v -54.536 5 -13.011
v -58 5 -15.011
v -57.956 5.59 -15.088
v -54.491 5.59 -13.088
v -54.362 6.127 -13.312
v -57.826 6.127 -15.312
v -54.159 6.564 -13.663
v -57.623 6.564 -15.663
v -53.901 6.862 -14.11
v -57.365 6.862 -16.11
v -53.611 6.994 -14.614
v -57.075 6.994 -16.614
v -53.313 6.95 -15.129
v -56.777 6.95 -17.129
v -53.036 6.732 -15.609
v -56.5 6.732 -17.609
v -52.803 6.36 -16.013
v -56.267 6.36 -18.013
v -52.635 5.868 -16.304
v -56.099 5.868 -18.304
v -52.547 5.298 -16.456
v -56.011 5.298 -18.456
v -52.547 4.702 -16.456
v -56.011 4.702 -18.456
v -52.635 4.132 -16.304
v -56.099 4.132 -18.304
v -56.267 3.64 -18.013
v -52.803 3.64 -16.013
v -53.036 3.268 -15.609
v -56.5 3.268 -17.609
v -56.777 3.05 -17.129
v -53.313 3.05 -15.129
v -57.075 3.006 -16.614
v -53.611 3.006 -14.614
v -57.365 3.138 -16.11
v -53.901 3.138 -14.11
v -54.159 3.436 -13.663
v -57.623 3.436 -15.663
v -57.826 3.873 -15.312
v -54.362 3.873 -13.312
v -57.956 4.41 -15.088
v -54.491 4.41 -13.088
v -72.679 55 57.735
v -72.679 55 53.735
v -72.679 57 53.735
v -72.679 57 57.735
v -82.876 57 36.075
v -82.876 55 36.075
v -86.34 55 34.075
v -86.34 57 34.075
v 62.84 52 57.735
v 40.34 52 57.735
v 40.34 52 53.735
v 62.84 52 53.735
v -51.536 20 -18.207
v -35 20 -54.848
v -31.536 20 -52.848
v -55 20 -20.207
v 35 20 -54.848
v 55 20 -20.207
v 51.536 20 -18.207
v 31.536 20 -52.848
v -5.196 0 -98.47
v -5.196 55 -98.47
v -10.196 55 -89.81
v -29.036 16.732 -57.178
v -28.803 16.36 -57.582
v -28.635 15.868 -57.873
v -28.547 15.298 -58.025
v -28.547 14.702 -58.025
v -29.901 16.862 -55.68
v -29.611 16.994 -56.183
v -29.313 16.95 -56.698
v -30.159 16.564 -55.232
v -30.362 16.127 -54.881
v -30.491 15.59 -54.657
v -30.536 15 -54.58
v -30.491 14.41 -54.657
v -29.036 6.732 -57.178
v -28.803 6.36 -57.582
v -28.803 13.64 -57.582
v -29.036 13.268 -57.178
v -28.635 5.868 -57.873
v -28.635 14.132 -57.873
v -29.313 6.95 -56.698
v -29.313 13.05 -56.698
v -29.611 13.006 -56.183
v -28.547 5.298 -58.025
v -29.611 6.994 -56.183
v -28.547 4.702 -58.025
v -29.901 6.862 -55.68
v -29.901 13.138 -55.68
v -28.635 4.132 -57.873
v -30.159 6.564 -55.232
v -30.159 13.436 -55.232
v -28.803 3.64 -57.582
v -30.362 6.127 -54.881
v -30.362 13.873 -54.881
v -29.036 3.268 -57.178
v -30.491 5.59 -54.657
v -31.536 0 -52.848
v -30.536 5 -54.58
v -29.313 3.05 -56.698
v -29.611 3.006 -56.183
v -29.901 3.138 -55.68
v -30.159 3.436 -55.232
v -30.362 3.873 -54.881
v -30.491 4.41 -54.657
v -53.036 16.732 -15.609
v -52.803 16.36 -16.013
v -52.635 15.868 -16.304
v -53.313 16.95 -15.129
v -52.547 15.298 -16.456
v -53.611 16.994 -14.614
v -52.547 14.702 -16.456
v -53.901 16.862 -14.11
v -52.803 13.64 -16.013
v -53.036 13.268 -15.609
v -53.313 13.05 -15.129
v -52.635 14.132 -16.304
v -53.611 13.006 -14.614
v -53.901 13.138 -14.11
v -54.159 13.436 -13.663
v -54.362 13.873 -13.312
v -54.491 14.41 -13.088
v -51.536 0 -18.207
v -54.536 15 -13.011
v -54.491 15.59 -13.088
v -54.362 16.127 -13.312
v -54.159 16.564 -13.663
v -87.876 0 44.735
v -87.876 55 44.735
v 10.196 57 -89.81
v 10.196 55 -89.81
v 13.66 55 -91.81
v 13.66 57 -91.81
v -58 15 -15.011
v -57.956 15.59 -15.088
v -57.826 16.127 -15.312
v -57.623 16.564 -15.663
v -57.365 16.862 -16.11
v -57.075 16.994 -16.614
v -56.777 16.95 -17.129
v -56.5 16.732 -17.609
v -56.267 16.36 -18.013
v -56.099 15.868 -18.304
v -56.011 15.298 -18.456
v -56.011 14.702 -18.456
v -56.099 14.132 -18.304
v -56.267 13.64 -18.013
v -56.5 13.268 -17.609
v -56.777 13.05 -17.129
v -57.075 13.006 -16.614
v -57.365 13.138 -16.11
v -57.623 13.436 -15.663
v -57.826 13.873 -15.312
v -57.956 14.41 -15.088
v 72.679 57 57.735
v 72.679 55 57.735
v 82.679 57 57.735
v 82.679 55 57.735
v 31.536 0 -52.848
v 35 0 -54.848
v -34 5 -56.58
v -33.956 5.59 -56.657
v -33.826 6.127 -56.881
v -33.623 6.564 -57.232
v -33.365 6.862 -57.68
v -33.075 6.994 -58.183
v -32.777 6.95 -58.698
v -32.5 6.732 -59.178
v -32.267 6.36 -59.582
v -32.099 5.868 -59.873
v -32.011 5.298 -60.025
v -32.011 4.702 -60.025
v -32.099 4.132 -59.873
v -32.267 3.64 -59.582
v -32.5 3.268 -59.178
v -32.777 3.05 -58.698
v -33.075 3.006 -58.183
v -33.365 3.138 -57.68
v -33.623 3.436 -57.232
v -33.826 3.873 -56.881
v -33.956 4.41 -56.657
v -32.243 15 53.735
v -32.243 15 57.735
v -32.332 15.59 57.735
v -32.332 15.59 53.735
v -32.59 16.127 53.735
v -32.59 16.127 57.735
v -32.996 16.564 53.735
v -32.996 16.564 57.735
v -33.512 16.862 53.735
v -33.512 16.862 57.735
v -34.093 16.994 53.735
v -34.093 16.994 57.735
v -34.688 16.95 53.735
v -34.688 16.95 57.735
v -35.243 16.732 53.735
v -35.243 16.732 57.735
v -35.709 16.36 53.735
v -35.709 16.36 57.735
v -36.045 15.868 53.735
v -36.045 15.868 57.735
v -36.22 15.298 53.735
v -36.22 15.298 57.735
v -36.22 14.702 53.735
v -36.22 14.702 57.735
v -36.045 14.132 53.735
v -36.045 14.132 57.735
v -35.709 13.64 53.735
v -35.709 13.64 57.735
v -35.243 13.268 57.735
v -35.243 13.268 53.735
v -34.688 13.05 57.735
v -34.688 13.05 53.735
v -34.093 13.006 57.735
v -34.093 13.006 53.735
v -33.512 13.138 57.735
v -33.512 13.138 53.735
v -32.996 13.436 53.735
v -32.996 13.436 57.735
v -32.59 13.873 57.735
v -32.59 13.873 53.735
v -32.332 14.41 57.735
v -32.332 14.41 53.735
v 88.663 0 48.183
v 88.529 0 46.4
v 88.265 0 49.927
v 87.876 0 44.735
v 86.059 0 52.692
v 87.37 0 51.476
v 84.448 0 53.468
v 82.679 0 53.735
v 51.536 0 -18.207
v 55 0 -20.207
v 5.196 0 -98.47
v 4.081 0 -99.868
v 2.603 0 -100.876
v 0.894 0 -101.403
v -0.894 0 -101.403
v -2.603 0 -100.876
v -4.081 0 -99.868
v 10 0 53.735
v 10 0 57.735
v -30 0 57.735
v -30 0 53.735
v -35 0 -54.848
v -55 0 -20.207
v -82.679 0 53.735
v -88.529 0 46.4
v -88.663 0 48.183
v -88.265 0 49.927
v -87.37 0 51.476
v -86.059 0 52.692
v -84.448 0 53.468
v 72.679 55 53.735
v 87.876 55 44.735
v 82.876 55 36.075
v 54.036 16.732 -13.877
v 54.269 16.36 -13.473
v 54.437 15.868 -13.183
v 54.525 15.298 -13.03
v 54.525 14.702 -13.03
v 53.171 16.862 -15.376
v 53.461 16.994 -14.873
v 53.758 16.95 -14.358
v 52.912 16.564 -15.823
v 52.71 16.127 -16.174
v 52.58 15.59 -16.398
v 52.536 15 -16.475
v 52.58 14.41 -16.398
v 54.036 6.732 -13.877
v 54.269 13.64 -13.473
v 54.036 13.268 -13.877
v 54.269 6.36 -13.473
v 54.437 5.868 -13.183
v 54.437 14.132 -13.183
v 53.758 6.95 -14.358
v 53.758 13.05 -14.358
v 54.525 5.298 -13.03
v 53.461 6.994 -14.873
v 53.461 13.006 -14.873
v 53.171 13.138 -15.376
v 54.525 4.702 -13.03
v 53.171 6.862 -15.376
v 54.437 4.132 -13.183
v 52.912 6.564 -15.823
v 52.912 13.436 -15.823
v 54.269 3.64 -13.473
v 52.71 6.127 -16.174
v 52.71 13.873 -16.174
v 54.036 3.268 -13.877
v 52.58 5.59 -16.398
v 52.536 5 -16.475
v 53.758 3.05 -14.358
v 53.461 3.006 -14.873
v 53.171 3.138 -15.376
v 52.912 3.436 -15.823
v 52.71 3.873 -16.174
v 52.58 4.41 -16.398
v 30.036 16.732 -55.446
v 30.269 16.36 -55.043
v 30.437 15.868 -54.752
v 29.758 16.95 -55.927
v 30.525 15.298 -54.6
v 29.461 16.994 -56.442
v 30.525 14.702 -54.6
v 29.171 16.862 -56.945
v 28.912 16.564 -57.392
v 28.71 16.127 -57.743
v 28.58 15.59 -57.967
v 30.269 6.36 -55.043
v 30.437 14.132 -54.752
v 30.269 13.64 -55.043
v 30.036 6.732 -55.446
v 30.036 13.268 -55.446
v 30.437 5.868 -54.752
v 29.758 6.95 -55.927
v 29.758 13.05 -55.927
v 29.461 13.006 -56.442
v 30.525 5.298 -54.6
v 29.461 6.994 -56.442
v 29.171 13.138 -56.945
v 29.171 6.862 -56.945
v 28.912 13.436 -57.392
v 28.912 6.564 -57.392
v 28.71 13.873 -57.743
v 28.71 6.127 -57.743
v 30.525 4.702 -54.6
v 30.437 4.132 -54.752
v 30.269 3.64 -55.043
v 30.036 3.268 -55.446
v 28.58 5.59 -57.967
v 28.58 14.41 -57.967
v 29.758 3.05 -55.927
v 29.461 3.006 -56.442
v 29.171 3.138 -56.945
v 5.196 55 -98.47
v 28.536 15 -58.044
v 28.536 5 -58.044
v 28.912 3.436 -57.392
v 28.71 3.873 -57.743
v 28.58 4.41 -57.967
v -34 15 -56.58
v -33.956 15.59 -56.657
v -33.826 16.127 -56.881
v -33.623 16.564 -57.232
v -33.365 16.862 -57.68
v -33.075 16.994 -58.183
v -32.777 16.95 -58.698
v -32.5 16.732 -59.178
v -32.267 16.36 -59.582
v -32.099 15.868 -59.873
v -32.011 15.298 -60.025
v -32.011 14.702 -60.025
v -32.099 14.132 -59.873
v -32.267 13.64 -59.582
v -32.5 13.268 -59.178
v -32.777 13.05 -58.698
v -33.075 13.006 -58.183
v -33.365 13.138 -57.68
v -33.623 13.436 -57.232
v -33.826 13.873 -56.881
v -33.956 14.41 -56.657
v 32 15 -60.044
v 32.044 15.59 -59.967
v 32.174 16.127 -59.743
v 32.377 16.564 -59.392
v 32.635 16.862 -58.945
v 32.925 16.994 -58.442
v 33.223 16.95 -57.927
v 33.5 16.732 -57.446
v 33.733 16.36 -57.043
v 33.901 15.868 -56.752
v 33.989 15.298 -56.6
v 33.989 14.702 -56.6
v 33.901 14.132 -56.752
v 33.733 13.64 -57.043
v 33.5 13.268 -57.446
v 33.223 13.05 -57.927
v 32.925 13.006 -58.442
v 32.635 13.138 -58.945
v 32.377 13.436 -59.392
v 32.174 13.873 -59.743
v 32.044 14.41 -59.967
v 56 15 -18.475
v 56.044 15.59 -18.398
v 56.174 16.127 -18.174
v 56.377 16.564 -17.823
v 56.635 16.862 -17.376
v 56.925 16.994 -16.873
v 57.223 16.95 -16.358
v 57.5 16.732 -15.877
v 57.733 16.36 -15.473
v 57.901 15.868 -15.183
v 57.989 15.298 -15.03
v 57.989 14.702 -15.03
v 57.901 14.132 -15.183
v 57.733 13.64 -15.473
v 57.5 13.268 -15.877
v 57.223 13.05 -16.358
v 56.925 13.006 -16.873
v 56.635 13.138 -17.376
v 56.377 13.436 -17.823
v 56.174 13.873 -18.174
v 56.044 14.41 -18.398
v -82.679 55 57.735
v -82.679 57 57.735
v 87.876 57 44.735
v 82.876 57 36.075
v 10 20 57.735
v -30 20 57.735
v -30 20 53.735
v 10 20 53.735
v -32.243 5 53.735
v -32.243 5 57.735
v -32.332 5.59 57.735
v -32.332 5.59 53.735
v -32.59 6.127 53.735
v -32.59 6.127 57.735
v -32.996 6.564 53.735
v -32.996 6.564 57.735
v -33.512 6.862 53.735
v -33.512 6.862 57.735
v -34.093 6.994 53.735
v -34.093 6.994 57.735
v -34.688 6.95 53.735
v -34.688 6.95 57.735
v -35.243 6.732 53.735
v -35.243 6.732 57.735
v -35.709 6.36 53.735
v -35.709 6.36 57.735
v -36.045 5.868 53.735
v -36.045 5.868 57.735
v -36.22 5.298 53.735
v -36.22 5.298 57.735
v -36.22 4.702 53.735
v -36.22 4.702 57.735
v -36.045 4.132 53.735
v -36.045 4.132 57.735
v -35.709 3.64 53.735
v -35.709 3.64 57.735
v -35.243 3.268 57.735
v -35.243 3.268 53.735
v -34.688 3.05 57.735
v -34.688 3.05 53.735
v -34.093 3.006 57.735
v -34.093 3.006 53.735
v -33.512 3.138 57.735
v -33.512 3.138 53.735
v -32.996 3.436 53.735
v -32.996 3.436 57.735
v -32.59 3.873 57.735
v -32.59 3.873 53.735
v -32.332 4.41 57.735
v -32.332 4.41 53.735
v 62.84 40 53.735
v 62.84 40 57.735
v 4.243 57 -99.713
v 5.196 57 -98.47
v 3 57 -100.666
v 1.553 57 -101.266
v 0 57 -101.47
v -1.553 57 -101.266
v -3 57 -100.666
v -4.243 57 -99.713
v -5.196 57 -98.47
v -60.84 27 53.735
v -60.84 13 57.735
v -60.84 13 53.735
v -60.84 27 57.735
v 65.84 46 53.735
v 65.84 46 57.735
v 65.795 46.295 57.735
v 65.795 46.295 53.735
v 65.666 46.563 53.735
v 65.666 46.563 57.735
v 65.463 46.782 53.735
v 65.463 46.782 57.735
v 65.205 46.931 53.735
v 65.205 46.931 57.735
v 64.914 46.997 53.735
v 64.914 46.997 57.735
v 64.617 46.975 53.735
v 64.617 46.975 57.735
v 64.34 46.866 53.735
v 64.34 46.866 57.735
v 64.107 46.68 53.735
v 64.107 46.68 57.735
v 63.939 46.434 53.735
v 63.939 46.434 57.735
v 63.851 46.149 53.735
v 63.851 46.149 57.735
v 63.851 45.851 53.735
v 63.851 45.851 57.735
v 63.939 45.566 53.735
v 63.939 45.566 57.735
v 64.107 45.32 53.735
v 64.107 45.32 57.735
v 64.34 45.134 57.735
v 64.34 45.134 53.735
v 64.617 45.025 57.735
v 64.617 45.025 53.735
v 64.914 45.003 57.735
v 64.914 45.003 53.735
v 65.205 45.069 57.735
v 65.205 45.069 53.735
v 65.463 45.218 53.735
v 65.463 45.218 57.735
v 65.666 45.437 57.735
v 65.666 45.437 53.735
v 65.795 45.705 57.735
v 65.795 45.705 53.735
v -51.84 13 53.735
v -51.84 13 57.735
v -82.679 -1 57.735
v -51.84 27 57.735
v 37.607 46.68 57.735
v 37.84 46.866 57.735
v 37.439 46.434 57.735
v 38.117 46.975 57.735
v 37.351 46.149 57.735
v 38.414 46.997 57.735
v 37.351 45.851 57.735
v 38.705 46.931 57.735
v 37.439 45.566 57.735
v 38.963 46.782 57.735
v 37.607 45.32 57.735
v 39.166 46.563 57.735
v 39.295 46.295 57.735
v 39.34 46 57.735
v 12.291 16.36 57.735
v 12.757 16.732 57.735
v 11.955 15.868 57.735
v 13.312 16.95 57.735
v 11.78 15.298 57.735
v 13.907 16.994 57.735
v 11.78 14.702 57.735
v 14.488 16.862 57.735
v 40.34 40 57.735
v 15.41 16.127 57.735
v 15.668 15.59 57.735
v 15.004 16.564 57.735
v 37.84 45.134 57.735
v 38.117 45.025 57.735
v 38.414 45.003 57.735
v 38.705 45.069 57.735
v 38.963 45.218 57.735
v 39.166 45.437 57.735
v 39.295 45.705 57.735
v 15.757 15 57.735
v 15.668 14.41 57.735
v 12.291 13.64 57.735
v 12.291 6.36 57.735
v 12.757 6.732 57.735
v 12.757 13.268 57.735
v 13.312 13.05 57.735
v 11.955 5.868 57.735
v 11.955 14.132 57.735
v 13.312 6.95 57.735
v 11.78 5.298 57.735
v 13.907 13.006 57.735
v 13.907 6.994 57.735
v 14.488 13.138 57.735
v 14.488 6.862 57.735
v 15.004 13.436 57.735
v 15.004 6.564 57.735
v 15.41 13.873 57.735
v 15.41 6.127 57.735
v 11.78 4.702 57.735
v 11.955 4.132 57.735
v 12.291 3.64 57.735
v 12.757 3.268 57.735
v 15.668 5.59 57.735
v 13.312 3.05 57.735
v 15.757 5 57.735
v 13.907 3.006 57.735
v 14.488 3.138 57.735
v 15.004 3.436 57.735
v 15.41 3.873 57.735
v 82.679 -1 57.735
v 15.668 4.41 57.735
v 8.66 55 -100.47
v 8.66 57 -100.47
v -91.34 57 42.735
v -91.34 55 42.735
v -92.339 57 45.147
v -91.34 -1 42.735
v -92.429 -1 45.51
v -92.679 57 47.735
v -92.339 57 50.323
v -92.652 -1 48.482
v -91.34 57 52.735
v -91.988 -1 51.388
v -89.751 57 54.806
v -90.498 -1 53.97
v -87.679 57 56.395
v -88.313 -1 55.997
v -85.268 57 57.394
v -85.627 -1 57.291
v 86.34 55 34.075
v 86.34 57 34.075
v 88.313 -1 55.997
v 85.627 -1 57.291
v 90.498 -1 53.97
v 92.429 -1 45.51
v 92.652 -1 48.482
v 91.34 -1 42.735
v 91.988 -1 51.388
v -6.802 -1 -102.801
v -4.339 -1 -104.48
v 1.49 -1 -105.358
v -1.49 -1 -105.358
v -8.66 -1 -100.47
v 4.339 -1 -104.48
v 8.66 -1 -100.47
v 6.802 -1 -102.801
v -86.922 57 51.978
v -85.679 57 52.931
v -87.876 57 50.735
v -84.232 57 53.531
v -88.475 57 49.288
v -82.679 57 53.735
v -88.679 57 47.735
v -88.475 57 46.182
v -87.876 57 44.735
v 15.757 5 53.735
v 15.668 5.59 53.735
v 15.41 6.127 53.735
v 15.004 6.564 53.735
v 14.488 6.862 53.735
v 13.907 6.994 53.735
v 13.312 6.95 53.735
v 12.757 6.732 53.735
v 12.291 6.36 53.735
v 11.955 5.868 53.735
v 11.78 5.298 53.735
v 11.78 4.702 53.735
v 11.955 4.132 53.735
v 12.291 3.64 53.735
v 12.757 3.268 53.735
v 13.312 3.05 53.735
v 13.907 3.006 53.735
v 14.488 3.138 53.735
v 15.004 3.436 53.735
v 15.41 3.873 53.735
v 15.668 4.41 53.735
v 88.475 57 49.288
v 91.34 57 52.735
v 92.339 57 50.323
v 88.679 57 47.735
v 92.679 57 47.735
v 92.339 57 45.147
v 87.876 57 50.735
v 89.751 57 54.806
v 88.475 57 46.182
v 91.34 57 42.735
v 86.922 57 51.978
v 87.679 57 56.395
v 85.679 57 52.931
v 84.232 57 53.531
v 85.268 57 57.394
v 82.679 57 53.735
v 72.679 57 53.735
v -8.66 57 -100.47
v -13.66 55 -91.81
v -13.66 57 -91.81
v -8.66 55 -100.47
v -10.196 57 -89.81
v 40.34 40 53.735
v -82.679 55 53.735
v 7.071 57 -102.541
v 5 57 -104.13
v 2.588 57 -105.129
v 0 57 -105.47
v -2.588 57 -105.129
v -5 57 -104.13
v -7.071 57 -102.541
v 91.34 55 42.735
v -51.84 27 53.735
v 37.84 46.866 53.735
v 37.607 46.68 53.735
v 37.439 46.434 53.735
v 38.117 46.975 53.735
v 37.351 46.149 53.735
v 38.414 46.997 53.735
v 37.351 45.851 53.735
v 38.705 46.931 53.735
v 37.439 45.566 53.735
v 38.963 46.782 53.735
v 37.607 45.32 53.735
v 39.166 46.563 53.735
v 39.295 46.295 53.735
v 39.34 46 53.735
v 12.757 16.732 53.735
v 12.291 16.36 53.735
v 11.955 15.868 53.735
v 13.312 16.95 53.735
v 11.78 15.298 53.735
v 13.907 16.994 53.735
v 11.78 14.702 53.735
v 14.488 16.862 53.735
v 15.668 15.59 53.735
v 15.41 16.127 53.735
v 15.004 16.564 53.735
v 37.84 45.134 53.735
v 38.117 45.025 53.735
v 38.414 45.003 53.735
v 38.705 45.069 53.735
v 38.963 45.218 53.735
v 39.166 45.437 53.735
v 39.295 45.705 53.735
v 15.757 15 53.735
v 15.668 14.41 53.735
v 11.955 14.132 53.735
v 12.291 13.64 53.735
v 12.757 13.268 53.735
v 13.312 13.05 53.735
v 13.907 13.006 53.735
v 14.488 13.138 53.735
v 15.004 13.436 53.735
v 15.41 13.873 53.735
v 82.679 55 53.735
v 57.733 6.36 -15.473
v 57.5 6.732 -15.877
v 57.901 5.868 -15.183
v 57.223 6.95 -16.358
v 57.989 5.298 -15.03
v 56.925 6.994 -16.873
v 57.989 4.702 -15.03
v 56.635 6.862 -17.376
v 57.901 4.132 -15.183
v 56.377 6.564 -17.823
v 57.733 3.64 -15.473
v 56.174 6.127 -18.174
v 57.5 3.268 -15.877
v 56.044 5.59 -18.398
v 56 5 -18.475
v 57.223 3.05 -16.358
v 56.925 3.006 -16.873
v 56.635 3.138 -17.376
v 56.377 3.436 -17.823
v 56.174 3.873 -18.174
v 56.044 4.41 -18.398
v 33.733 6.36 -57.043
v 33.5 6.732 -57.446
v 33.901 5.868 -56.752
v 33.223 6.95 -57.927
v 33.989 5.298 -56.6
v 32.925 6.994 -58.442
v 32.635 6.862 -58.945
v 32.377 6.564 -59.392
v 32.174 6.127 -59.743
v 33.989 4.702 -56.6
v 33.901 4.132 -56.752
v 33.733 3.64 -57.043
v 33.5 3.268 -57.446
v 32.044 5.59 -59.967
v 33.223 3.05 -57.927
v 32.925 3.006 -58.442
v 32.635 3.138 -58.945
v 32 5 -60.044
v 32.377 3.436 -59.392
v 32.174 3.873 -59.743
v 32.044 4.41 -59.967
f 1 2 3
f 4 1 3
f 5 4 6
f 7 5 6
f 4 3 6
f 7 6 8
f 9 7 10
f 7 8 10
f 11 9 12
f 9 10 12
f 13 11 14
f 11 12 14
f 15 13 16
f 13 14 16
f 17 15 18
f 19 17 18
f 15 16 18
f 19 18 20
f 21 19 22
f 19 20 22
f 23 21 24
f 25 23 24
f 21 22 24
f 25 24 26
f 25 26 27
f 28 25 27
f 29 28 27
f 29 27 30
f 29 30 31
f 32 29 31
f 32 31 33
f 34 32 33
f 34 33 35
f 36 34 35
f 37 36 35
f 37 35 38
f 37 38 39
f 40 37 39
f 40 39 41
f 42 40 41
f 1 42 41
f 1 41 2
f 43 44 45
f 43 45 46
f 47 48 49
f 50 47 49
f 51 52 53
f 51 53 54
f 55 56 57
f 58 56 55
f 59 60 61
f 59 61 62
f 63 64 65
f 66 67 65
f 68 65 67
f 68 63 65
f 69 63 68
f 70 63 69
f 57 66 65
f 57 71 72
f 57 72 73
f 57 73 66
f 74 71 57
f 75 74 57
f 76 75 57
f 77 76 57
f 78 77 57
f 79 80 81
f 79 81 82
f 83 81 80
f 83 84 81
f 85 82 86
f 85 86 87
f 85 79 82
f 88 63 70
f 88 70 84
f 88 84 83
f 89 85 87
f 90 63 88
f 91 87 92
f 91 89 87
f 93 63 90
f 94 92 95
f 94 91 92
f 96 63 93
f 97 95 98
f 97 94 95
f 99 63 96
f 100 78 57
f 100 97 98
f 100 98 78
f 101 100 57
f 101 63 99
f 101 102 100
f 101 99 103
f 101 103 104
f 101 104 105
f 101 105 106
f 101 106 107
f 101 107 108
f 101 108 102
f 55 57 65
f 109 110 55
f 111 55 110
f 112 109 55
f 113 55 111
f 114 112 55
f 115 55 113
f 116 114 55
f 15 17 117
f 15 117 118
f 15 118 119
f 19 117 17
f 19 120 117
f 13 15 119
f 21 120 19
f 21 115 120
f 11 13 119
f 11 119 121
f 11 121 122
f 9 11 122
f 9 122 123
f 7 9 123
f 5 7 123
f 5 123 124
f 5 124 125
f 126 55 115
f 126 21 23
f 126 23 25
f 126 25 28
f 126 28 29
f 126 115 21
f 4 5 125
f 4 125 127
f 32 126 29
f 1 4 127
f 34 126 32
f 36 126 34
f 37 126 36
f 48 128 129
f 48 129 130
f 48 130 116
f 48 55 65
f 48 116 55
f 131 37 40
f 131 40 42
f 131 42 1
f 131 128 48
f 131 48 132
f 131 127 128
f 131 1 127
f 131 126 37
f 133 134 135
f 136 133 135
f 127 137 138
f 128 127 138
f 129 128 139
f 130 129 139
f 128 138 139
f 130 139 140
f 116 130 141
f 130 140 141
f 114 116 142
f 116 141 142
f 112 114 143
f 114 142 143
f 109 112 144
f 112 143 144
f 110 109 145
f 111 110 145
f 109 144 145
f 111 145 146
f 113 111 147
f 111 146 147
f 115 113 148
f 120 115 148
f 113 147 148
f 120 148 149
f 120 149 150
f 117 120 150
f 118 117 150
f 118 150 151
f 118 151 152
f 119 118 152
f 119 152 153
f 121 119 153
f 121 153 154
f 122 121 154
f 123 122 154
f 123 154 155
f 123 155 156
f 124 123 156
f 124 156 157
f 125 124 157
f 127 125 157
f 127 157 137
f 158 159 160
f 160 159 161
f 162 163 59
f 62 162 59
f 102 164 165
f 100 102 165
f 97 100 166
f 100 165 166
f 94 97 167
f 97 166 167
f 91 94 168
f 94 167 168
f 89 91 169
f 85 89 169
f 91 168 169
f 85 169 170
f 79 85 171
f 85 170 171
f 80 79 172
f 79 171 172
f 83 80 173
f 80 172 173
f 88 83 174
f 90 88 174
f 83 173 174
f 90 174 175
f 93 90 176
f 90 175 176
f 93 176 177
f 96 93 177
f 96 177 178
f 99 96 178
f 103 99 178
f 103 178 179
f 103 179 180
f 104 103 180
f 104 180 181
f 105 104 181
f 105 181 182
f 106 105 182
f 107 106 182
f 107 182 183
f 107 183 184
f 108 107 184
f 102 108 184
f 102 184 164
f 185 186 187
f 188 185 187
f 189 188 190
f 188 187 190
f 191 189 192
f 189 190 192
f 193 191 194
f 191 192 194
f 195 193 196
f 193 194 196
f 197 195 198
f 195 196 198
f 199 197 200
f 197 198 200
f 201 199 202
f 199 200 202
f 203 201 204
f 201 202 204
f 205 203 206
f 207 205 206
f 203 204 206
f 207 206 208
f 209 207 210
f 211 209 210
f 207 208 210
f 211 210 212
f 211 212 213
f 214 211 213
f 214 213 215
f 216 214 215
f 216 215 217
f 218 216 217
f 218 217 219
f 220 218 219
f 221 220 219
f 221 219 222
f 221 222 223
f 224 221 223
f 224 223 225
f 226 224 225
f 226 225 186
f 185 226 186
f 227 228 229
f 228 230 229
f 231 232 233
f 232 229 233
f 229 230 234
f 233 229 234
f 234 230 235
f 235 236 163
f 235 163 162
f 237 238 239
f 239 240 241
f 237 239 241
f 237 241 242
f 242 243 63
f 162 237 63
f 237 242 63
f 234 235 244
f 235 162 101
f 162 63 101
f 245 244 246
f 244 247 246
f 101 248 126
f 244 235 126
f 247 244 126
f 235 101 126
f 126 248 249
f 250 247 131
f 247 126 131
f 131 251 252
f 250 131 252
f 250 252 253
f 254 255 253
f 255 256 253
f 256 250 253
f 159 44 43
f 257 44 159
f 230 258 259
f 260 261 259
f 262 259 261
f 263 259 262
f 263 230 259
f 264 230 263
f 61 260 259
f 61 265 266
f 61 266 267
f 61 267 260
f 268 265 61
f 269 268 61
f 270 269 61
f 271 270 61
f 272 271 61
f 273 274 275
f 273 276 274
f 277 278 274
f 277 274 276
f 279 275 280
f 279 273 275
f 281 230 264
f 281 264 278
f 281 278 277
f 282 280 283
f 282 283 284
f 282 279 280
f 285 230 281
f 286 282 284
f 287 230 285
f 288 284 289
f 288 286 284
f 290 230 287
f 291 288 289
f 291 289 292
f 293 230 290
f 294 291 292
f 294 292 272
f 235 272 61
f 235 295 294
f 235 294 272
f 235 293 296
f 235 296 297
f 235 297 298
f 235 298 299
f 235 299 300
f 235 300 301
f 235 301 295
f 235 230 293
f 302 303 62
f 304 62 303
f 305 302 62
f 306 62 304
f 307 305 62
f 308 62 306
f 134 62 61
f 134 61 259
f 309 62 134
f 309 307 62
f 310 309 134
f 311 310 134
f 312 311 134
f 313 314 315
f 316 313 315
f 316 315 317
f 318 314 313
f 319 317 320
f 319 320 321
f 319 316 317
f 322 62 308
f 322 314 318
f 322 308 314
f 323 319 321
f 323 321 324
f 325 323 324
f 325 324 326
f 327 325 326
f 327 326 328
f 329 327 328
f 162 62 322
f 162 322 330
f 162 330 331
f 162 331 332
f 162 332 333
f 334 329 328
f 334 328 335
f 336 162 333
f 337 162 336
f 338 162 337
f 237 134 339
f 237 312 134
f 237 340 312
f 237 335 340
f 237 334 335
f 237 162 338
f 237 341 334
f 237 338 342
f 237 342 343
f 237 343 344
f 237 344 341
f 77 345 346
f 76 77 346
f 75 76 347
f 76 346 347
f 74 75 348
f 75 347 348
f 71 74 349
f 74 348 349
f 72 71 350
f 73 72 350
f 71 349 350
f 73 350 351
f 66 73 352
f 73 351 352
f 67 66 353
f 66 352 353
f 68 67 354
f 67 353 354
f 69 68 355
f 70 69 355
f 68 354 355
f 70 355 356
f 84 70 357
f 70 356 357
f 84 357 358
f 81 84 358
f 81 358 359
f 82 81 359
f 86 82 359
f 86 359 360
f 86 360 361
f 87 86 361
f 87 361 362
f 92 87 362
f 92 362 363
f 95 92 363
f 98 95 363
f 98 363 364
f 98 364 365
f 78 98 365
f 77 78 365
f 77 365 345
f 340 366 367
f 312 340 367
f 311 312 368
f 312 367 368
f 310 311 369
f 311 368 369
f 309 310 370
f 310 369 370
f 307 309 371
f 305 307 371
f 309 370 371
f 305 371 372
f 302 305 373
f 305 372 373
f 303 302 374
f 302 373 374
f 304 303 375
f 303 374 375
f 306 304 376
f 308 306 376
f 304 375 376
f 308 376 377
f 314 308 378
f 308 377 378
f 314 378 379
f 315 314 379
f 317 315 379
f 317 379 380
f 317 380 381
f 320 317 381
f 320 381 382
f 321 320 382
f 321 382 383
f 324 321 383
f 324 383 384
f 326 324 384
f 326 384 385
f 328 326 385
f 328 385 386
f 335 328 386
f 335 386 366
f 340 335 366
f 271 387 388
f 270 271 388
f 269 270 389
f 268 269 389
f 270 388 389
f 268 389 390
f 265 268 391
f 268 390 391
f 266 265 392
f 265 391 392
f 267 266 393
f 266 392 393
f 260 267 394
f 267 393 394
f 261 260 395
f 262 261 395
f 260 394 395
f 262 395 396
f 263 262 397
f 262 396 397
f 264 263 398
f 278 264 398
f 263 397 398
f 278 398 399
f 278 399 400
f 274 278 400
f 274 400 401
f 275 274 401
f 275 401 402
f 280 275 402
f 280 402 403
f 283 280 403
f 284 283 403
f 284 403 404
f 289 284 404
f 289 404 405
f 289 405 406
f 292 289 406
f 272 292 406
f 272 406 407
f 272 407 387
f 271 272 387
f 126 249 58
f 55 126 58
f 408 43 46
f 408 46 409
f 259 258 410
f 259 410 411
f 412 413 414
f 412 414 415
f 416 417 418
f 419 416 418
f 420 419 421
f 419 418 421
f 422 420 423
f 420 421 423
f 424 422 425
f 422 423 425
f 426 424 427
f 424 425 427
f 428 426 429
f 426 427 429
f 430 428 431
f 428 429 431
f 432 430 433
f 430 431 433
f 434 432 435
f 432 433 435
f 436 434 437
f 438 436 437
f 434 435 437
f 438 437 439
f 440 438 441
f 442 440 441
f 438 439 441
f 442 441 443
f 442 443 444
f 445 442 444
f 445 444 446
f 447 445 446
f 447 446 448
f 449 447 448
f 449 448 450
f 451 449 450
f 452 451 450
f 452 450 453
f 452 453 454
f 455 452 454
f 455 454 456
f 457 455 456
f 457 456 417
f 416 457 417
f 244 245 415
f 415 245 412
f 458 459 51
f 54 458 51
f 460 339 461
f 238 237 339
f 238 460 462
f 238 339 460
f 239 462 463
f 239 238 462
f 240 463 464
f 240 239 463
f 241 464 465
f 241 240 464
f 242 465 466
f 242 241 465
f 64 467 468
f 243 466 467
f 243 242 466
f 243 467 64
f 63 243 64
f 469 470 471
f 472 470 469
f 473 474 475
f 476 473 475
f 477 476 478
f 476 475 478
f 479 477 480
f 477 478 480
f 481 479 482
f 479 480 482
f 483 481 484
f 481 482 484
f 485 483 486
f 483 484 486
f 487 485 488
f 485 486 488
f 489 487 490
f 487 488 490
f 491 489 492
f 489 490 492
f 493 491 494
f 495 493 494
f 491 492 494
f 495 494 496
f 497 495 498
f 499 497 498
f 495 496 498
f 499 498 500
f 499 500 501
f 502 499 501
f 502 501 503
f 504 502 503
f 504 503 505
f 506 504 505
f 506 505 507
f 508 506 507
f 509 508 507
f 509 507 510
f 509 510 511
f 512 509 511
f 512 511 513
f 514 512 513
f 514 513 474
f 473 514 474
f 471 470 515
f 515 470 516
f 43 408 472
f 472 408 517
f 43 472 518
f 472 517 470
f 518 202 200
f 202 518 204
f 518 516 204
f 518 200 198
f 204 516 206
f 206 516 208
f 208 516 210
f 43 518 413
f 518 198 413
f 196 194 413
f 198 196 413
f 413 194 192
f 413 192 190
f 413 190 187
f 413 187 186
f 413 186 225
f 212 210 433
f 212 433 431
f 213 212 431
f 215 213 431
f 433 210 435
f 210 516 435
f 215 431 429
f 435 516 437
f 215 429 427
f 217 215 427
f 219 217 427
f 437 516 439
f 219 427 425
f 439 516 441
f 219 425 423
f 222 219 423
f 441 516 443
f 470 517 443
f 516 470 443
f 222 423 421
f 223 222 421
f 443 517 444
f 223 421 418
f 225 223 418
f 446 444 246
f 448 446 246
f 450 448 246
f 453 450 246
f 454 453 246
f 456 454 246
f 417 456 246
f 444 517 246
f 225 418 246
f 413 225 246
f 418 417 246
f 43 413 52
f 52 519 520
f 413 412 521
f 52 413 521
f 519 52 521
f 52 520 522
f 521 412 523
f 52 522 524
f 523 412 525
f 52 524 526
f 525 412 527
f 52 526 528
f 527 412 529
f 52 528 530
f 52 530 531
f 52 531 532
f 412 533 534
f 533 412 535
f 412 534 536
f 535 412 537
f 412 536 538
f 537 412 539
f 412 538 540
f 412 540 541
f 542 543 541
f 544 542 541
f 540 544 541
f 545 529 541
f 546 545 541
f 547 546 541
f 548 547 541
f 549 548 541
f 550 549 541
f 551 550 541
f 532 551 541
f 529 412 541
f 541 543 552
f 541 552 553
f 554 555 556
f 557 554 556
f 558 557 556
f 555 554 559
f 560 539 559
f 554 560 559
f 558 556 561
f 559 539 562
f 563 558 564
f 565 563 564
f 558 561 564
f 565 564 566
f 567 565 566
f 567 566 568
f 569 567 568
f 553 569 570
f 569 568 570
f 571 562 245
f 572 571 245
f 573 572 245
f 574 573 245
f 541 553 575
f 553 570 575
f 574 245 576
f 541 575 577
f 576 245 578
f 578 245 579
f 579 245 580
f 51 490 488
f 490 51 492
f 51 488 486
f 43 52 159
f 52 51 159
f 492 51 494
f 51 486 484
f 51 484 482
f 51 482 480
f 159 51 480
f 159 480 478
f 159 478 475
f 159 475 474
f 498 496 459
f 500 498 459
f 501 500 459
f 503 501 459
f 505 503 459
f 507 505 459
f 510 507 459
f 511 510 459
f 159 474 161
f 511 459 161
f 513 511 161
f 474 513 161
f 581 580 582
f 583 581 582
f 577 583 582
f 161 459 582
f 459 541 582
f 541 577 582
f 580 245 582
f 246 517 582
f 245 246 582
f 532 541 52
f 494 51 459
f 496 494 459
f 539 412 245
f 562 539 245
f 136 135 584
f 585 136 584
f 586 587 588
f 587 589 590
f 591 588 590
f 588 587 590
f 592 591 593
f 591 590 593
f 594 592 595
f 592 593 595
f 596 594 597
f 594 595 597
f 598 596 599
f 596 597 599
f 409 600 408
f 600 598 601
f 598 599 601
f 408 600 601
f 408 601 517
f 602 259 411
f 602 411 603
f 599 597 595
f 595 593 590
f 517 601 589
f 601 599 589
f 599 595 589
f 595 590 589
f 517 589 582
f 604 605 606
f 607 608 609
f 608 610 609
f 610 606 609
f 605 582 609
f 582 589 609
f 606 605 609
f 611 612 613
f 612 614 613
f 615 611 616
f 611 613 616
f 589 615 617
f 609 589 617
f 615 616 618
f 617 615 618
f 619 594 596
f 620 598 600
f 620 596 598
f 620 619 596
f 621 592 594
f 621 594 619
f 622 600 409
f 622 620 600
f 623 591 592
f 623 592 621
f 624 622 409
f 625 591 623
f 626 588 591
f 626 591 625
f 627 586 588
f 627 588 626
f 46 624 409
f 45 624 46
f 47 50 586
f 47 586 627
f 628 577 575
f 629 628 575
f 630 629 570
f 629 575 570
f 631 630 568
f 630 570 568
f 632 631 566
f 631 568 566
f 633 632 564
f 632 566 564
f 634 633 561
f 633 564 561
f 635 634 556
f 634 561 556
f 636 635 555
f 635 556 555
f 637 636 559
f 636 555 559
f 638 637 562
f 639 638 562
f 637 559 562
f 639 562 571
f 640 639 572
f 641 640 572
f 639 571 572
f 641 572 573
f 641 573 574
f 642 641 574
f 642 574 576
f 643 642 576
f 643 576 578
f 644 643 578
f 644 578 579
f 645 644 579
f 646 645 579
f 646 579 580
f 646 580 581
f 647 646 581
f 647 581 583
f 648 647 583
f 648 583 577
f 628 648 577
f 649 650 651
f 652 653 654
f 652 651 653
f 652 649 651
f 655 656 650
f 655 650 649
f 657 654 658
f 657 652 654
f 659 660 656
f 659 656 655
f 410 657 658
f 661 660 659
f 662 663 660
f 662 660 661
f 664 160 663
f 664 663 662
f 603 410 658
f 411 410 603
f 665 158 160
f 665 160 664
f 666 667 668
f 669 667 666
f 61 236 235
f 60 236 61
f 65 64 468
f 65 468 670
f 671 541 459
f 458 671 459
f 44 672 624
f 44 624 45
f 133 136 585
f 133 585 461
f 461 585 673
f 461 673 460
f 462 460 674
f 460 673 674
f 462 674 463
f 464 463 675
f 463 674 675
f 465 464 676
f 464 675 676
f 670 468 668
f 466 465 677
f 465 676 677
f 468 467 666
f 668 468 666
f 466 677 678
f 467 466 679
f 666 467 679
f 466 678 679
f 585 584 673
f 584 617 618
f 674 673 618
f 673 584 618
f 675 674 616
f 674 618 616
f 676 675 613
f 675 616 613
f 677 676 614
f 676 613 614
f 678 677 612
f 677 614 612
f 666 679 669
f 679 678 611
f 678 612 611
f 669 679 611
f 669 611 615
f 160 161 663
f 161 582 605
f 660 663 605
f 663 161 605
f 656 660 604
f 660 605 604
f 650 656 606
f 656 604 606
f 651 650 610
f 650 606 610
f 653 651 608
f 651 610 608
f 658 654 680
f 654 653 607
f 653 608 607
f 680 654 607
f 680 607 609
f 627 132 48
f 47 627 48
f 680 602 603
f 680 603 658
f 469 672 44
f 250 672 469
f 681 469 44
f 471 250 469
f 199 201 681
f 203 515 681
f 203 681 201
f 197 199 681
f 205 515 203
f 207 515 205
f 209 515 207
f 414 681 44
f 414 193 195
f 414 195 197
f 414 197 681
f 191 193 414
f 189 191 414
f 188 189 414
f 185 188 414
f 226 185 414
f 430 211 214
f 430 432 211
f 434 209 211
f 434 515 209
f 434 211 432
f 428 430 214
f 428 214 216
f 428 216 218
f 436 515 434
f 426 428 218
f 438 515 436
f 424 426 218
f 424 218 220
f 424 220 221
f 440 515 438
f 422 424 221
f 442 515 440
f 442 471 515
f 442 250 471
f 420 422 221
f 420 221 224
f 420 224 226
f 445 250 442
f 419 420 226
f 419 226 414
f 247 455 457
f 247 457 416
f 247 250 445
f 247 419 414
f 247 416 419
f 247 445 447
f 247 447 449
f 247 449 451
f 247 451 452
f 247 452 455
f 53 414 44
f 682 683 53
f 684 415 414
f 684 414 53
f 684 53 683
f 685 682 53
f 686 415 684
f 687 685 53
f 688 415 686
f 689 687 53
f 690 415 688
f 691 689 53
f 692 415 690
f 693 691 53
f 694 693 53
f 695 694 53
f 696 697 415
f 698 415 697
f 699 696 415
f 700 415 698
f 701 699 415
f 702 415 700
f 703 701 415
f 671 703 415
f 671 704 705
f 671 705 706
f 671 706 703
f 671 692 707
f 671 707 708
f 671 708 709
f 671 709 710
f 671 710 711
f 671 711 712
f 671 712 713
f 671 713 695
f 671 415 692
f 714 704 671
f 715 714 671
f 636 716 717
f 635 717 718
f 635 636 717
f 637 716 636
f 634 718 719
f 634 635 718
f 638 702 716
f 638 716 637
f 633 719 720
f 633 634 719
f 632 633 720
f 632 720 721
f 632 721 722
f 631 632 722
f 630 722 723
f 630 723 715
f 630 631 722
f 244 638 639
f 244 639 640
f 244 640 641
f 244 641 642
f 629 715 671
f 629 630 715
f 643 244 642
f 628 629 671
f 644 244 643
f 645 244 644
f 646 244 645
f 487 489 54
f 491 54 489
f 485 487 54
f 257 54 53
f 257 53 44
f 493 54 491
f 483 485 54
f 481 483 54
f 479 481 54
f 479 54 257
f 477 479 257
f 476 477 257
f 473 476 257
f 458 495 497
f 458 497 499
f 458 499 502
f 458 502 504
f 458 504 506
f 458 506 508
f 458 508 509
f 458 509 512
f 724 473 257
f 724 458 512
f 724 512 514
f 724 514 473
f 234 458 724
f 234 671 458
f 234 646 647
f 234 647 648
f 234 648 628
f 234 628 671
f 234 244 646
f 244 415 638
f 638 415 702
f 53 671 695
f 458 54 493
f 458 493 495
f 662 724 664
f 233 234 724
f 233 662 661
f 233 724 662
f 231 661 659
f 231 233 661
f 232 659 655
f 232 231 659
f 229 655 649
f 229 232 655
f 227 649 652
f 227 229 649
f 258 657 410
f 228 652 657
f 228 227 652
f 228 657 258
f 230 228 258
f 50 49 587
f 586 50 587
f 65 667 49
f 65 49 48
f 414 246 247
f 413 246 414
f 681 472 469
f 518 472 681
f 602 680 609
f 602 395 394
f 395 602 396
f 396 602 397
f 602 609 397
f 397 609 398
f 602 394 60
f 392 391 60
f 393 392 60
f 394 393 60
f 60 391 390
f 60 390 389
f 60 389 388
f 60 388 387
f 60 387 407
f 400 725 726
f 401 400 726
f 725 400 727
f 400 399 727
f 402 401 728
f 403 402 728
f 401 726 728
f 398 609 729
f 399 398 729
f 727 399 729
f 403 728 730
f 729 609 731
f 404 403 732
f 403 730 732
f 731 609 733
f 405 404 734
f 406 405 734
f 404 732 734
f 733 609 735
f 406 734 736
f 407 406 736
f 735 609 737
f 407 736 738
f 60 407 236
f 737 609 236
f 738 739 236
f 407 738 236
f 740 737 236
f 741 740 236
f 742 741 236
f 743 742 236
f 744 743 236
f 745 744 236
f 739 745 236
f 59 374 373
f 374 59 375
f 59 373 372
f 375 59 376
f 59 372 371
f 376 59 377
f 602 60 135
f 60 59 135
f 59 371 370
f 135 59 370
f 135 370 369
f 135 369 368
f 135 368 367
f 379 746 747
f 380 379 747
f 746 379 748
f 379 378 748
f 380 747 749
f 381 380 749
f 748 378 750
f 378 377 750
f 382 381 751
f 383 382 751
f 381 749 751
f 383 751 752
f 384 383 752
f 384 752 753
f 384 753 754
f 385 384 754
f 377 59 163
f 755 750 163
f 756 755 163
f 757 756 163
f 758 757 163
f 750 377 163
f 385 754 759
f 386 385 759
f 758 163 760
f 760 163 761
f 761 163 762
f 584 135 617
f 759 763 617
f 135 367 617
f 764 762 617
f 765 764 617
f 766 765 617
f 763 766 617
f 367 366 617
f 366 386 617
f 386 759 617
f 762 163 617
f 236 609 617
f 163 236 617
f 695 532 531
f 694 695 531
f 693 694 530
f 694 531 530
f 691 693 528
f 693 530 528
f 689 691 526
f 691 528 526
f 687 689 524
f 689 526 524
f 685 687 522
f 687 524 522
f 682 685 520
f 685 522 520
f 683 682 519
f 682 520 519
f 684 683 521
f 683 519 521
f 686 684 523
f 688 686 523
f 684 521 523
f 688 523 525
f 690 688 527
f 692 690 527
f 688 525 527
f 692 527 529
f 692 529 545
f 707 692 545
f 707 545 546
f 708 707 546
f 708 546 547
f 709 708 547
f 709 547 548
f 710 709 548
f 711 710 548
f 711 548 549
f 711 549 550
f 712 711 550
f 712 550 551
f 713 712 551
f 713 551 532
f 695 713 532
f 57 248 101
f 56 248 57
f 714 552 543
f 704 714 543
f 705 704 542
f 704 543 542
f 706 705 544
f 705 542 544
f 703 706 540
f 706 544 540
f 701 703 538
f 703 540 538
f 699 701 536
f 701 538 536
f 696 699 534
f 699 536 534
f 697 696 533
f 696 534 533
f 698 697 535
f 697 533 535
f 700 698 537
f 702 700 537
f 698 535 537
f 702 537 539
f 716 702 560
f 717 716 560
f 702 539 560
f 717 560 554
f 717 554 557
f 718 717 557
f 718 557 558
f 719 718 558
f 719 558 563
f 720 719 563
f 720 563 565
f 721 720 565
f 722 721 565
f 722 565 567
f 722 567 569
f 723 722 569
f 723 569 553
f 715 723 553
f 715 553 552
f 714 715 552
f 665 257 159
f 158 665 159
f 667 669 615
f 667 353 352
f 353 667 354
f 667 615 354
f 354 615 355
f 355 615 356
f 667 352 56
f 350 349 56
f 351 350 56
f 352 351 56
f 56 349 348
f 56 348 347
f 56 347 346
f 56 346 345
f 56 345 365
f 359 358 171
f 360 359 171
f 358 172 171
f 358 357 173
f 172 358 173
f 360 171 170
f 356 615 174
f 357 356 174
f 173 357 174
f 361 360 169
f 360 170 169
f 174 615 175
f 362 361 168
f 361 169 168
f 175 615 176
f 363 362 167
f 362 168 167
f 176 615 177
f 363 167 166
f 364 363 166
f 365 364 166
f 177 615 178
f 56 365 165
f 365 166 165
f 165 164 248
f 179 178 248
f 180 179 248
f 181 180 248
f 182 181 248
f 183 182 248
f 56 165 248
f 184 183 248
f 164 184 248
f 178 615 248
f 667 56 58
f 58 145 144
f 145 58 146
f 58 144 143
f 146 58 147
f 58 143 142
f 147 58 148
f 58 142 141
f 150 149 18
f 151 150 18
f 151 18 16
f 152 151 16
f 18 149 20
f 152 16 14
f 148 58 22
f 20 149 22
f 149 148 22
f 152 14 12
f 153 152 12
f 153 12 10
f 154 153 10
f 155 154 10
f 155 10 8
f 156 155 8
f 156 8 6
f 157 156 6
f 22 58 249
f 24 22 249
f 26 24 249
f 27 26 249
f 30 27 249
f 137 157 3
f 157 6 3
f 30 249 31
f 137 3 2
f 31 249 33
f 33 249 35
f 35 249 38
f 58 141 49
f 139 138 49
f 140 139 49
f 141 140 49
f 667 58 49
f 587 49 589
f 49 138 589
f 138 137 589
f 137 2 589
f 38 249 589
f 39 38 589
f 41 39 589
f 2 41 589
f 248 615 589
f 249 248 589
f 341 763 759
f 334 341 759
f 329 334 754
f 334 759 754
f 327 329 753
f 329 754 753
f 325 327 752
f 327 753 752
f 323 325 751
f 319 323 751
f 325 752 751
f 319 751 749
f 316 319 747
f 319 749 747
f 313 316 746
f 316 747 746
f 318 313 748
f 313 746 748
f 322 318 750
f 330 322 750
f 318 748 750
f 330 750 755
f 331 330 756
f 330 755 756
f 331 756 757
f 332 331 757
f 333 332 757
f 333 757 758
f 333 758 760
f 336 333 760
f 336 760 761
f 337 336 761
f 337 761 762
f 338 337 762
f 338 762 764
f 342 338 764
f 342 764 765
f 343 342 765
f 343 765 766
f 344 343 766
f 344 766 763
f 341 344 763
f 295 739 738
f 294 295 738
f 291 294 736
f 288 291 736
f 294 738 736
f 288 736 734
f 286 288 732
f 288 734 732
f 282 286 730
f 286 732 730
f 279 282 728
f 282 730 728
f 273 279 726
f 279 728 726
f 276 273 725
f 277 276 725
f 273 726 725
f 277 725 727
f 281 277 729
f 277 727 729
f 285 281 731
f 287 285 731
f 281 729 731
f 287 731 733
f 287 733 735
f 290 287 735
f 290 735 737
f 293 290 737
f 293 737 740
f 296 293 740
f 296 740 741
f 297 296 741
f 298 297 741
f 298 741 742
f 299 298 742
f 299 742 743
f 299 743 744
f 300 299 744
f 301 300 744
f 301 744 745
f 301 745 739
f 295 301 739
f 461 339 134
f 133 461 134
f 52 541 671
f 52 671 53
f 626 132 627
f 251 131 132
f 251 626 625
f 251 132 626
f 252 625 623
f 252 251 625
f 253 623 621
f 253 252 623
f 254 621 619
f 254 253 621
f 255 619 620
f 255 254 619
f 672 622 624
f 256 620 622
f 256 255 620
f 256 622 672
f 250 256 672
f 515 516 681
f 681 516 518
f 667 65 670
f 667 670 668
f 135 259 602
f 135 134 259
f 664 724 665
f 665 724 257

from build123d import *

# Parameters (mm, degrees)
BOSS_EXTRUDE1_DEPTH = 1
BOSS_EXTRUDE2_DEPTH = 55
BOSS_EXTRUDE3_START = -56
BOSS_EXTRUDE3_DEPTH = 58
SKETCH3_R           = 2
SKETCH3_R_2         = 1
SKETCH3_W           = 40
SKETCH3_H           = 20
SKETCH3_W_2         = 22.5
SKETCH3_H_2         = 12
SKETCH3_W_3         = 9
SKETCH3_H_3         = 14
BACK_DEPTH          = 10
SKETCH6_R           = 2
SKETCH6_W           = 40
SKETCH6_H           = 20
CUT_EXTRUDE3_DEPTH  = 10
SKETCH7_R           = 2
SKETCH7_W           = 40
SKETCH7_H           = 20
CUT_EXTRUDE4_DEPTH  = 10
CIRPATTERN1_COUNT   = 3


with BuildPart() as part:
    # Sketch2 → Boss-Extrude1 (new body)
    with BuildSketch(Plane(origin=(0, 0, 0), x_dir=(1, 0, 0), z_dir=(0, 1, 0))):
        with BuildLine():
            Line((-8.660254038, 100.470053838), (-91.339745962, -42.735026919))
            ThreePointArc((-91.339745962, -42.735026919), (-91.339745962, -52.735026919), (-82.679491924, -57.735026919))
            Line((-82.679491924, -57.735026919), (82.679491924, -57.735026919))
            ThreePointArc((82.679491924, -57.735026919), (91.339745962, -52.735026919), (91.339745962, -42.735026919))
            Line((91.339745962, -42.735026919), (8.660254038, 100.470053838))
            ThreePointArc((8.660254038, 100.470053838), (0, 105.470053838), (-8.660254038, 100.470053838))
        make_face()
    extrude(amount=-BOSS_EXTRUDE1_DEPTH)

    # Sketch2<6> → Boss-Extrude2 (add)
    with BuildSketch(Plane(origin=(0, 0, 0), x_dir=(1, 0, 0), z_dir=(0, 1, 0))):
        with BuildLine():
            Line((-8.660254038, 100.470053838), (-91.339745962, -42.735026919))
            ThreePointArc((-91.339745962, -42.735026919), (-91.339745962, -52.735026919), (-82.679491924, -57.735026919))
            Line((-82.679491924, -57.735026919), (82.679491924, -57.735026919))
            ThreePointArc((82.679491924, -57.735026919), (91.339745962, -52.735026919), (91.339745962, -42.735026919))
            Line((91.339745962, -42.735026919), (8.660254038, 100.470053838))
            ThreePointArc((8.660254038, 100.470053838), (0, 105.470053838), (-8.660254038, 100.470053838))
        make_face()
        with BuildLine():
            Line((-5.196152423, 98.470053838), (-87.875644347, -44.735026919))
            ThreePointArc((-87.875644347, -44.735026919), (-87.875644347, -50.735026919), (-82.679491924, -53.735026919))
            Line((-82.679491924, -53.735026919), (82.679491924, -53.735026919))
            ThreePointArc((82.679491924, -53.735026919), (87.875644347, -50.735026919), (87.875644347, -44.735026919))
            Line((87.875644347, -44.735026919), (5.196152423, 98.470053838))
            ThreePointArc((5.196152423, 98.470053838), (0, 101.470053838), (-5.196152423, 98.470053838))
        make_face(mode=Mode.SUBTRACT)
    extrude(amount=BOSS_EXTRUDE2_DEPTH)

    # Sketch4 → Boss-Extrude3 (add)
    with BuildSketch(Plane(origin=(0, 55, 0), x_dir=(1, 0, 0), z_dir=(0, 1, 0)).offset(BOSS_EXTRUDE3_START)):
        with BuildLine():
            Line((0, 105.470053838), (0, 101.470053838))
            ThreePointArc((0, 101.470053838), (-3, 100.666206261), (-5.196152423, 98.470053838))
            Line((-5.196152423, 98.470053838), (-10.196152423, 89.8097998))
            Line((-10.196152423, 89.8097998), (-13.660254038, 91.8097998))
            Line((-13.660254038, 91.8097998), (-8.660254038, 100.470053838))
            ThreePointArc((-8.660254038, 100.470053838), (-5, 104.130307876), (0, 105.470053838))
        make_face()
        with BuildLine():
            Line((-82.875644347, -36.074772881), (-86.339745962, -34.074772881))
            Line((-86.339745962, -34.074772881), (-91.339745962, -42.735026919))
            ThreePointArc((-91.339745962, -42.735026919), (-92.679491924, -47.735026919), (-91.339745962, -52.735026919))
            Line((-91.339745962, -52.735026919), (-87.875644347, -50.735026919))
            ThreePointArc((-87.875644347, -50.735026919), (-88.679491924, -47.735026919), (-87.875644347, -44.735026919))
            Line((-87.875644347, -44.735026919), (-82.875644347, -36.074772881))
        make_face()
    boss_extrude3 = extrude(amount=BOSS_EXTRUDE3_DEPTH)

    # Sketch3 → Back (cut)
    with BuildSketch(Plane.XY.offset(57.735026919)):
        with Locations((-34.24280037, 15)):
            Circle(SKETCH3_R)
        with Locations((-34.24280037, 5)):
            Circle(SKETCH3_R)
        with Locations((13.75719963, 15)):
            Circle(SKETCH3_R)
        with Locations((13.75719963, 5)):
            Circle(SKETCH3_R)
        with Locations((38.339745962, 46)):
            Circle(SKETCH3_R_2)
        with Locations((64.839745962, 46)):
            Circle(SKETCH3_R_2)
        with Locations((-10, 10)):
            Rectangle(SKETCH3_W, SKETCH3_H)
        with Locations((51.589745962, 46)):
            Rectangle(SKETCH3_W_2, SKETCH3_H_2)
        with Locations((-56.339745962, 20)):
            Rectangle(SKETCH3_W_3, SKETCH3_H_3)
    extrude(amount=-BACK_DEPTH, mode=Mode.SUBTRACT)

    # Sketch6 → Cut-Extrude3 (cut)
    with BuildSketch(Plane(origin=(50, 0, -28.867513459), x_dir=(-0.5, 0, -0.866025404), z_dir=(0.866025404, 0, -0.5))):
        with Locations((-14, 15)):
            Circle(SKETCH6_R)
        with Locations((-14, 5)):
            Circle(SKETCH6_R)
        with Locations((34, 15)):
            Circle(SKETCH6_R)
        with Locations((34, 5)):
            Circle(SKETCH6_R)
        with Locations((10, 10)):
            Rectangle(SKETCH6_W, SKETCH6_H)
    extrude(amount=-CUT_EXTRUDE3_DEPTH, mode=Mode.SUBTRACT)

    # Sketch7 → Cut-Extrude4 (cut)
    with BuildSketch(Plane(origin=(-50, 0, -28.867513459), x_dir=(-0.5, 0, 0.866025404), z_dir=(-0.866025404, 0, -0.5))):
        with Locations((-34, 15)):
            Circle(SKETCH7_R)
        with Locations((-34, 5)):
            Circle(SKETCH7_R)
        with Locations((14, 15)):
            Circle(SKETCH7_R)
        with Locations((14, 5)):
            Circle(SKETCH7_R)
        with Locations((-10, 10)):
            Rectangle(SKETCH7_W, SKETCH7_H)
    extrude(amount=-CUT_EXTRUDE4_DEPTH, mode=Mode.SUBTRACT)

    # CirPattern1: Boss-Extrude3 ×3 about axis
    cirpattern1_axis = Axis((0, 0, 0), (0, 1, 0))
    for i in range(1, CIRPATTERN1_COUNT):
        add(boss_extrude3.rotate(cirpattern1_axis, i * 360 / CIRPATTERN1_COUNT))


solid = part.part
